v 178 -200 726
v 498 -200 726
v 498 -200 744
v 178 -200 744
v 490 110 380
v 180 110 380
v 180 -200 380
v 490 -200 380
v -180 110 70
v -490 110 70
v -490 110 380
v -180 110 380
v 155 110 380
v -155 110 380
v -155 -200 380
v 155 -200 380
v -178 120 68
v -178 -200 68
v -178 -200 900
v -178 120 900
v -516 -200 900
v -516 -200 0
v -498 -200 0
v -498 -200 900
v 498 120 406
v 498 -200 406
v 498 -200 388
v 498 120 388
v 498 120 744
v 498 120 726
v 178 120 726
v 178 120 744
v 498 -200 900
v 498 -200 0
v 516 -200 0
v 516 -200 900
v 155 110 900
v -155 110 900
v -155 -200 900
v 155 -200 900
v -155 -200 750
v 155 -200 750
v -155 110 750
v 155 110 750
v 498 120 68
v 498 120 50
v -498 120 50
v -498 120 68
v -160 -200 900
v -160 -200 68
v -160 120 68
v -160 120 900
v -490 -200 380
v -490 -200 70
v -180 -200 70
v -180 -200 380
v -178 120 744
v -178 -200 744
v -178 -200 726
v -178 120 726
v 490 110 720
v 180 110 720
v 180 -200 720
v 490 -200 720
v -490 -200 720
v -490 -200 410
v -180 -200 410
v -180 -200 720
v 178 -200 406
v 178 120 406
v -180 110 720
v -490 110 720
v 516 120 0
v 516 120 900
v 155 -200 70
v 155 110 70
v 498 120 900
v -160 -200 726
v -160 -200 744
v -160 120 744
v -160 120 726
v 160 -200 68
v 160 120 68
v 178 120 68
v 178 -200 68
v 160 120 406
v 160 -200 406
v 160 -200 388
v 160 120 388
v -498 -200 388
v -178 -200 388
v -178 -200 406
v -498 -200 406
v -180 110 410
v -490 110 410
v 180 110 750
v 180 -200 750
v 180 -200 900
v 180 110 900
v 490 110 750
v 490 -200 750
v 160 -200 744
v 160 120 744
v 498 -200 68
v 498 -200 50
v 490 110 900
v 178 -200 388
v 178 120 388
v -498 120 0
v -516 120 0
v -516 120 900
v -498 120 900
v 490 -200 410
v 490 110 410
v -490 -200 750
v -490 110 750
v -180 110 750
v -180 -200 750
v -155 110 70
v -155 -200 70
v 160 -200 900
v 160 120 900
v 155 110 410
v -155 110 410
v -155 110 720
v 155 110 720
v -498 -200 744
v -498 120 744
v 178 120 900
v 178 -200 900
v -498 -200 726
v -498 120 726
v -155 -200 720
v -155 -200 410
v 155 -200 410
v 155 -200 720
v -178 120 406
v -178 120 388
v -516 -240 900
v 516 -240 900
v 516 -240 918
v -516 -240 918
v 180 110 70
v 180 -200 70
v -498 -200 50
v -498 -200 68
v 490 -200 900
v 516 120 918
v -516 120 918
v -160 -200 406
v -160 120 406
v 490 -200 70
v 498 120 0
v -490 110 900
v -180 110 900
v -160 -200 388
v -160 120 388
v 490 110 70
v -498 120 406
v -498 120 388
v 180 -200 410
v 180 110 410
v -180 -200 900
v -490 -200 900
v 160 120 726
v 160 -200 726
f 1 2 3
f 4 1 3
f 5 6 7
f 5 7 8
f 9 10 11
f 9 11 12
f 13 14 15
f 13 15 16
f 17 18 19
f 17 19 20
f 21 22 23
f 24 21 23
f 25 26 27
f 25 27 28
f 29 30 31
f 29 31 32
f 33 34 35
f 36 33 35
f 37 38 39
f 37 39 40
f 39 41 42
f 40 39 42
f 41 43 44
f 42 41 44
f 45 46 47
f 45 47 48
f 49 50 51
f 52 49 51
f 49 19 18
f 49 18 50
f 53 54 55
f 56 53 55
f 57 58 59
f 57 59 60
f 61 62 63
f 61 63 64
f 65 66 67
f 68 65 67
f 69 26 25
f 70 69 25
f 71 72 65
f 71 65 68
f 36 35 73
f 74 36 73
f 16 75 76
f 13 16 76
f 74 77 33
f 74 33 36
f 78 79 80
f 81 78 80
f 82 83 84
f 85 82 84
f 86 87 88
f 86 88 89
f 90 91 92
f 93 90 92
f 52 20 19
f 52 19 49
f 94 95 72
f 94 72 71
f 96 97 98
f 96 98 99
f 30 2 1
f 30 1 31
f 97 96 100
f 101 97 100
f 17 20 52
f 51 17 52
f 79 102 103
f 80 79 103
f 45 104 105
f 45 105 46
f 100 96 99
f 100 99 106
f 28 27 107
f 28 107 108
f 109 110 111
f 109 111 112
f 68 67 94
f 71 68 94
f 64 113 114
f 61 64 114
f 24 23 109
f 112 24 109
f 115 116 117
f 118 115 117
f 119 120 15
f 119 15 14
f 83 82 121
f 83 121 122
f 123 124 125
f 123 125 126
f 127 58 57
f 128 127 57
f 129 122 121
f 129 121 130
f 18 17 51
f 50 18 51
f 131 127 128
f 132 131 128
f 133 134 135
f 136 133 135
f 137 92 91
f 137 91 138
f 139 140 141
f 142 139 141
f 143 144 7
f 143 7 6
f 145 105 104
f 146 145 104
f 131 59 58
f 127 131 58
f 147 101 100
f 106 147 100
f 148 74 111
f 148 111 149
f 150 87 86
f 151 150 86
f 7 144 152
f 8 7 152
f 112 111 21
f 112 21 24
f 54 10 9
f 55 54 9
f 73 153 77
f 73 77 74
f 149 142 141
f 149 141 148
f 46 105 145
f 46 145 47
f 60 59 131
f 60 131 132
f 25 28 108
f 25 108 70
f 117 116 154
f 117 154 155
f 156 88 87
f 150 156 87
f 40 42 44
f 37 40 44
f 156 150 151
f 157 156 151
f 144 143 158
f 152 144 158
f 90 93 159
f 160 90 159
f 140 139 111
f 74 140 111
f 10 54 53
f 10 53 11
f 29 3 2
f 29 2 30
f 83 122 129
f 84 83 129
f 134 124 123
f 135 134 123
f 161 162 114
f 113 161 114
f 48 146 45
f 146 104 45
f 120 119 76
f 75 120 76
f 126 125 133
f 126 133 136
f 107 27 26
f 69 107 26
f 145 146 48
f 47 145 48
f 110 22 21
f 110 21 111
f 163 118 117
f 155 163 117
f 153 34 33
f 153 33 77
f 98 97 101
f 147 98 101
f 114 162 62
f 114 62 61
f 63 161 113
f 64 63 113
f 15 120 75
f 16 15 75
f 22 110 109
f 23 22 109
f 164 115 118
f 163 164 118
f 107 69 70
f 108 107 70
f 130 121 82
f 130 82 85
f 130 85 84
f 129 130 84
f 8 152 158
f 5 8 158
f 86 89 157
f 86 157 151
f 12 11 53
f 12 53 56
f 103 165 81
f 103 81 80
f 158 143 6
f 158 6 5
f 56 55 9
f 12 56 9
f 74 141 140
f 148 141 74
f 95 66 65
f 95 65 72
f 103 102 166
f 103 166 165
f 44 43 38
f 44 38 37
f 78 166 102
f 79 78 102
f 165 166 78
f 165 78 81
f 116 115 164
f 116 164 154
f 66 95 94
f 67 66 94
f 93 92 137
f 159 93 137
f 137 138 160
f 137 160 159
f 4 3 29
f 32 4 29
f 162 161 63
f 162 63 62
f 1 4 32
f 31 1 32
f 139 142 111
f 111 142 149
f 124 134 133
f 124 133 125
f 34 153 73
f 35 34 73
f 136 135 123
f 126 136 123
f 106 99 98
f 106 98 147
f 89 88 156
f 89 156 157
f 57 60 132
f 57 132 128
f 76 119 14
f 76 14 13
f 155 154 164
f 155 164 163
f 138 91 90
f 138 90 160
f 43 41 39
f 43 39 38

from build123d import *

# Parameters (mm, degrees)
F0_W      = 18
F0_H      = 320
F1_DEPTH  = 900
F3_W      = 18
F3_H      = 320
F4_DEPTH  = 832
F5_W      = 320
F5_H      = 18
F6_DEPTH  = 498
F10_W     = 320
F10_H     = 18
F11_DEPTH = 320
F12_W     = 320
F12_H     = 18
F13_DEPTH = 320
F14_W     = 320
F14_H     = 18
F15_DEPTH = 320
F5_W_2    = 360
F16_DEPTH = 516
F18_W     = 310
F18_H     = 310
F19_DEPTH = 310
F21_W     = 310
F21_H     = 310
F22_DEPTH = 310
F24_W     = 310
F24_H     = 310
F25_DEPTH = 150


with BuildPart() as f1:
    # F0 (on Top) → F1 (new body)
    with BuildSketch(Plane.XY):
        with Locations((-507, -40)):
            Rectangle(F0_W, F0_H)
        with Locations((507, -40)):
            Rectangle(F0_W, F0_H)
    extrude(amount=F1_DEPTH)


with BuildPart() as f4:
    # F3 (on offset) → F4 (new body)
    with BuildSketch(Plane.XY.offset(68)):
        with Locations((-169, -40)):
            Rectangle(F3_W, F3_H)
        with Locations((169, -40)):
            Rectangle(F3_W, F3_H)
    extrude(amount=F4_DEPTH)


with BuildPart() as f6:
    # F5 (on Right) → F6 (new body, symmetric)
    with BuildSketch(Plane.YZ):
        with Locations((-40, 59)):
            Rectangle(F5_W, F5_H)
    extrude(amount=F6_DEPTH, both=True)


with BuildPart() as f11:
    # F10 (on offset) → F11 (new body)
    with BuildSketch(Plane.YZ.offset(-178)):
        with Locations((-40, 397)):
            Rectangle(F10_W, F10_H)
        with Locations((-40, 735)):
            Rectangle(F10_W, F10_H)
    extrude(amount=-F11_DEPTH)


with BuildPart() as f13:
    # F12 (on offset) → F13 (new body)
    with BuildSketch(Plane.YZ.offset(160)):
        with Locations((-40, 397)):
            Rectangle(F12_W, F12_H)
        with Locations((-40, 735)):
            Rectangle(F12_W, F12_H)
    extrude(amount=-F13_DEPTH)


with BuildPart() as f15:
    # F14 (on offset) → F15 (new body)
    with BuildSketch(Plane.YZ.offset(498)):
        with Locations((-40, 397)):
            Rectangle(F14_W, F14_H)
        with Locations((-40, 735)):
            Rectangle(F14_W, F14_H)
    extrude(amount=-F15_DEPTH)


with BuildPart() as f16:
    # F5 (on Right) → F16 (new body, symmetric)
    with BuildSketch(Plane.YZ):
        with Locations((-60, 909)):
            Rectangle(F5_W_2, F5_H)
    extrude(amount=F16_DEPTH, both=True)


with BuildPart() as f19:
    # F18 (on offset) → F19 (new body)
    with BuildSketch(Plane.XY.offset(70)):
        with Locations((-335, -45)):
            Rectangle(F18_W, F18_H)
        with Locations((0, -45)):
            Rectangle(F18_W, F18_H)
        with Locations((335, -45)):
            Rectangle(F18_W, F18_H)
    extrude(amount=F19_DEPTH)


with BuildPart() as f22:
    # F21 (on offset) → F22 (new body)
    with BuildSketch(Plane.XY.offset(410)):
        with Locations((-335, -45)):
            Rectangle(F21_W, F21_H)
        with Locations((0, -45)):
            Rectangle(F21_W, F21_H)
        with Locations((335, -45)):
            Rectangle(F21_W, F21_H)
    extrude(amount=F22_DEPTH)


with BuildPart() as f25:
    # F24 (on offset) → F25 (new body)
    with BuildSketch(Plane.XY.offset(750)):
        with Locations((-335, -45)):
            Rectangle(F24_W, F24_H)
        with Locations((0, -45)):
            Rectangle(F24_W, F24_H)
        with Locations((335, -45)):
            Rectangle(F24_W, F24_H)
    extrude(amount=F25_DEPTH)


solid = Compound([f1.part, f4.part, f6.part, f11.part, f13.part, f15.part, f16.part, f19.part, f22.part, f25.part])
